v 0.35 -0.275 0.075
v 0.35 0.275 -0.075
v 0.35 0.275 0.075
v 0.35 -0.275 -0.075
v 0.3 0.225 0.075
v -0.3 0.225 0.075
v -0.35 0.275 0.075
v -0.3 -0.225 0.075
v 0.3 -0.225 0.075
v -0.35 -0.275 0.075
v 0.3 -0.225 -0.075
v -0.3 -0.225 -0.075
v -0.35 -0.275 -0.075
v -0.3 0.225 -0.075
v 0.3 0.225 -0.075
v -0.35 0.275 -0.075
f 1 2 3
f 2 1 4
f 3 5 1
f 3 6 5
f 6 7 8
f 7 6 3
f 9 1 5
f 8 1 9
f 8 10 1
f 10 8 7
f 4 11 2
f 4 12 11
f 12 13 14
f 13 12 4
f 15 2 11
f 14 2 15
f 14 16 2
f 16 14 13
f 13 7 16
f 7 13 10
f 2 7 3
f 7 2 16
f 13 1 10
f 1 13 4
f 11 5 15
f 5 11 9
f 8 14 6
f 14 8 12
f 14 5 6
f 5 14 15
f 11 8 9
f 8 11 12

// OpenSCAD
edges = 1; // set by Makefile
canvas = 1; // set by Makefile

if (edges == 1) {
    difference() {
        cube([0.7, 0.55, 0.15], center = true);
        cube([0.6, 0.45, 0.2], center = true);
    }
}
// if (canvas == 1) {
//     cube([0.6, 0.45, 0.08], center = true);
// }
